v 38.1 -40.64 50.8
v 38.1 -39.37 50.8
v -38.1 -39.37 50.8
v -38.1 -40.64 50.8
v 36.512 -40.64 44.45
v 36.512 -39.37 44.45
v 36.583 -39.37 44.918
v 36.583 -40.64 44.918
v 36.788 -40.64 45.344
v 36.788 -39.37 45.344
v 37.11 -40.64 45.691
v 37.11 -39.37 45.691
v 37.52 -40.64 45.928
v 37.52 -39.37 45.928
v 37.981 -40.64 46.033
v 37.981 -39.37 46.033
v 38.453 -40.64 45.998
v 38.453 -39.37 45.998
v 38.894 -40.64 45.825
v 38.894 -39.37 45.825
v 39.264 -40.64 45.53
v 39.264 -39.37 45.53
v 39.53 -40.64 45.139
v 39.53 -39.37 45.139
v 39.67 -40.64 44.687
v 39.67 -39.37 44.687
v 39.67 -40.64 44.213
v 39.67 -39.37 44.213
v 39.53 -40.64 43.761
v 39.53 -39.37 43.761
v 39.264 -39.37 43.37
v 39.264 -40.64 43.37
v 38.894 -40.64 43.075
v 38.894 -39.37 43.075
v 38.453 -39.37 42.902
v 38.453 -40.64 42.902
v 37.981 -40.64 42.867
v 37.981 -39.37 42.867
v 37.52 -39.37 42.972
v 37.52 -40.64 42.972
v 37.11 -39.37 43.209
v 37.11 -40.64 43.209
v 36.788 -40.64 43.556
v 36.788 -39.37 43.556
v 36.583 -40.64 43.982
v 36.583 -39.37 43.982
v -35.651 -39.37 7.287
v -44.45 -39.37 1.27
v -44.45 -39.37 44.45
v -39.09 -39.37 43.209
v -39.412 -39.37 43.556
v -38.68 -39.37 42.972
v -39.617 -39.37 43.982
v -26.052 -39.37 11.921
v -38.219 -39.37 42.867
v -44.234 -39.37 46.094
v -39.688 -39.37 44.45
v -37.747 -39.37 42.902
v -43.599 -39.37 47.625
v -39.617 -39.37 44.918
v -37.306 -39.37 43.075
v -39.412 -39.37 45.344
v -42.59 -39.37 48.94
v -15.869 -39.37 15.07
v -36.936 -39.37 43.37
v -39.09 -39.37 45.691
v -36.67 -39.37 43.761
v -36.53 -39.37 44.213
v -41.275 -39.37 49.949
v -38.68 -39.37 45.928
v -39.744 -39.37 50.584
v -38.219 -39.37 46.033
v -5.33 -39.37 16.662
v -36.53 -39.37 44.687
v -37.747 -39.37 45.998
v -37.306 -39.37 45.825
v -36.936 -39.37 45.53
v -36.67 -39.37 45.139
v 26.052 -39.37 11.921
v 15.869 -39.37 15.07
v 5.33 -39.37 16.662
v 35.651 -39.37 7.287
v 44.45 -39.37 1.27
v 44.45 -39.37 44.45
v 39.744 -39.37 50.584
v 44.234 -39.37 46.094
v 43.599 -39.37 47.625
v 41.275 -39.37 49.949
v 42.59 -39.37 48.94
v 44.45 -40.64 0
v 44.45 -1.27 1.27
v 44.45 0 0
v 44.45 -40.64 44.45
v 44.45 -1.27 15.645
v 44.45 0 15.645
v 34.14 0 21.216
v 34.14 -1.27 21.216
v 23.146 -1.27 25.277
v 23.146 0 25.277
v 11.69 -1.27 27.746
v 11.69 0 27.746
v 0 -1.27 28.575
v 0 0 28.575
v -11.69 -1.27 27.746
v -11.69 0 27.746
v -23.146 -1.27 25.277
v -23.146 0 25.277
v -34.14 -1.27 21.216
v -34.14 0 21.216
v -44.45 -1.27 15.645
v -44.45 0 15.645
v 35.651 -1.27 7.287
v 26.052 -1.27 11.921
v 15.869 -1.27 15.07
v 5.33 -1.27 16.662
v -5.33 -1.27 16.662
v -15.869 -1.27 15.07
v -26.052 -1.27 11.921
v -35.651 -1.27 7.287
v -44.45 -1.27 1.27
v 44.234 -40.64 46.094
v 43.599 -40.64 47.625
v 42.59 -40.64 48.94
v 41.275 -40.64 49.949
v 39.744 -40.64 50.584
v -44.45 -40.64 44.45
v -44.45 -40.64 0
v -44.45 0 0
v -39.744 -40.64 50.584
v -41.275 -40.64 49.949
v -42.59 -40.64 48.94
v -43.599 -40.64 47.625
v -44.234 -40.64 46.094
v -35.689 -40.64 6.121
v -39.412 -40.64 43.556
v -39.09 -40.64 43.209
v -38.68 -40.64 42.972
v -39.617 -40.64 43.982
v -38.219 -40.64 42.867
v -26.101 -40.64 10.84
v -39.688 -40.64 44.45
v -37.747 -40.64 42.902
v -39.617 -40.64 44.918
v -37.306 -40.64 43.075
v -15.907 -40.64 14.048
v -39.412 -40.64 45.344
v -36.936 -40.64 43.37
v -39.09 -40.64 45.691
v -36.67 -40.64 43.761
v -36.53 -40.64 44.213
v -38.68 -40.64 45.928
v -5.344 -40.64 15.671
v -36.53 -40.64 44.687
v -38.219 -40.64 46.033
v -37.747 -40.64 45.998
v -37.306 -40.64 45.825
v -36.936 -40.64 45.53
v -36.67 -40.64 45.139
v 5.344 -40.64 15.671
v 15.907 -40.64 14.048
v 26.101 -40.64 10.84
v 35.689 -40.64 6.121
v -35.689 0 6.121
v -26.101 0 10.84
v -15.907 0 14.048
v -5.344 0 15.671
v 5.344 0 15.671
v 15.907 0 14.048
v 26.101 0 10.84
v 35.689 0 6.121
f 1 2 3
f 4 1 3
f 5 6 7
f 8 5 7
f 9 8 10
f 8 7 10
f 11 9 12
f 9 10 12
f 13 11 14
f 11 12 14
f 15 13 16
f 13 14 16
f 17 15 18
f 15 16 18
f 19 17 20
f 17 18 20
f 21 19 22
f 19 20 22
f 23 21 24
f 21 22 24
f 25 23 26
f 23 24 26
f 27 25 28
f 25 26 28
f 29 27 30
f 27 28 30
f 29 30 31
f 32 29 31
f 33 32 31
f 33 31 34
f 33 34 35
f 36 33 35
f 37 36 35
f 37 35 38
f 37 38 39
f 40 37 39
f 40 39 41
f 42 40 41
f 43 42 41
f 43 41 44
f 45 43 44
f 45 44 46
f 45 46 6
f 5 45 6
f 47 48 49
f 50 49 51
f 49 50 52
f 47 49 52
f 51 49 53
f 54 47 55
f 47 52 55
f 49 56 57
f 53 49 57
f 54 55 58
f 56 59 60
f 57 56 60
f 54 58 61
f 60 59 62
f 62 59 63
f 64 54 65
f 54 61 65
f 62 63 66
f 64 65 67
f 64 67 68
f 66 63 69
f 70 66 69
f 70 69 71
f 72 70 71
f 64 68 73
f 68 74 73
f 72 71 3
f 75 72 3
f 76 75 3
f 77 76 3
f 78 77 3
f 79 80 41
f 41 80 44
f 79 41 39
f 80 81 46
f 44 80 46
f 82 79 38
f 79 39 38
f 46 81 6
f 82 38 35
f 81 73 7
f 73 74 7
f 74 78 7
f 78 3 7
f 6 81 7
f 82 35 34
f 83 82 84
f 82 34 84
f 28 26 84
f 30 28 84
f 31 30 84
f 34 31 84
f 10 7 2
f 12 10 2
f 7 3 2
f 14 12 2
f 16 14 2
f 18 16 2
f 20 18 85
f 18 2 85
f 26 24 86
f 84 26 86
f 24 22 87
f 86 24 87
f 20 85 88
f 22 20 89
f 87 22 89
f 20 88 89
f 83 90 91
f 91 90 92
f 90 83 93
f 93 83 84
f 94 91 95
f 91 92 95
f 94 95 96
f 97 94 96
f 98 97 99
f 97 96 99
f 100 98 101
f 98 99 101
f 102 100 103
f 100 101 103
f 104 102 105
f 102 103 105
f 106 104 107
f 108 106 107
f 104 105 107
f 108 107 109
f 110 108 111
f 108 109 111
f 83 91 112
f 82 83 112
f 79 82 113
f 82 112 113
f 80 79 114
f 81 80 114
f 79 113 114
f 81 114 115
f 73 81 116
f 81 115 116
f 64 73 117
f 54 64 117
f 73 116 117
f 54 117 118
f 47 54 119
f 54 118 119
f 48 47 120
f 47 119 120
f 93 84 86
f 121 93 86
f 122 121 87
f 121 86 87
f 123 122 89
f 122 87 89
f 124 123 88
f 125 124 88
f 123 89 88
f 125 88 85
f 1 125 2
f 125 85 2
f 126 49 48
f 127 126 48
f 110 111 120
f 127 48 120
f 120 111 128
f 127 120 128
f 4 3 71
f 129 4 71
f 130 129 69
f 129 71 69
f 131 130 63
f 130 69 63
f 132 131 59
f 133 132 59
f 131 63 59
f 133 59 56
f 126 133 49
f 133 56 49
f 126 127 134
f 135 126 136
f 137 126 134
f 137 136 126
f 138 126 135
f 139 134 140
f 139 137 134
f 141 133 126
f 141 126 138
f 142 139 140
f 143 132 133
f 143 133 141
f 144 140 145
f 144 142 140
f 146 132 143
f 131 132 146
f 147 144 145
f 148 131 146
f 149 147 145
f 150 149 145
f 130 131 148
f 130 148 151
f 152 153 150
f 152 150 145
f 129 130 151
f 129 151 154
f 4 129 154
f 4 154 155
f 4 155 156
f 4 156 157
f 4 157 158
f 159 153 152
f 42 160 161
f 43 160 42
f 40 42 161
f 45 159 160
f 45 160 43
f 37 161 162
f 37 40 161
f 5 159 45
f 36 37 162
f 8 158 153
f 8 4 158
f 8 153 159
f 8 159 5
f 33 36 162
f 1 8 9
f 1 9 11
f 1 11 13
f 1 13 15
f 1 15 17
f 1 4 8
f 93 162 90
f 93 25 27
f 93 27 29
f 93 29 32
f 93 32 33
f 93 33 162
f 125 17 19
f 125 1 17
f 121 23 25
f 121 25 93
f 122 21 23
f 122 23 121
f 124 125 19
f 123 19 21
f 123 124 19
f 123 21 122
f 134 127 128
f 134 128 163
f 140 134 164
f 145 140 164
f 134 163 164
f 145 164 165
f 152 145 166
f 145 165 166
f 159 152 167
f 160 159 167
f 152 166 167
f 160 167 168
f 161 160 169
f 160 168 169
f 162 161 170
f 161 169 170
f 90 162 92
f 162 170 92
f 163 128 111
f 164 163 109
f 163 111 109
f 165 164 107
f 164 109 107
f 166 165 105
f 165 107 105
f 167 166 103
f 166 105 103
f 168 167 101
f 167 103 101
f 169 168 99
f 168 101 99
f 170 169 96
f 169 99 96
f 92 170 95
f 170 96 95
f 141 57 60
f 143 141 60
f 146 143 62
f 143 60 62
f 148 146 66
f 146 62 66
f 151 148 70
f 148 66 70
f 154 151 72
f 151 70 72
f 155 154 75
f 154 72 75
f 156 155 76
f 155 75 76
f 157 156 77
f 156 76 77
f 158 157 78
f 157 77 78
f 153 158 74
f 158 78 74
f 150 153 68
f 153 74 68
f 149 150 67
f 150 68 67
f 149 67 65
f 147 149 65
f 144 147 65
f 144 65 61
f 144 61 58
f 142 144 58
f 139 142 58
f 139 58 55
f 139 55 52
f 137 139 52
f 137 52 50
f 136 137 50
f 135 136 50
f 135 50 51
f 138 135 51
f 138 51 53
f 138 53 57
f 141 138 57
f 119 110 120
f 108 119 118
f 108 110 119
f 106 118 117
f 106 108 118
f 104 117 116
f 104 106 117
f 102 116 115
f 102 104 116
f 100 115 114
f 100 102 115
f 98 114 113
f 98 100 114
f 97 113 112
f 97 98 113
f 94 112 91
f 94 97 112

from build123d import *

# Parameters (mm, degrees)
F1_DEPTH = 1.27
F3_DEPTH = 38.1
F5_DEPTH = 1.27
F6_R     = 1.5875
F7_DEPTH = 25.4


with BuildPart() as f1:
    # F0 (on Front) → F1 (new body)
    with BuildSketch(Plane.XZ):
        with BuildLine():
            Line((-44.45, 15.644758), (-44.45, 0))
            ThreePointArc((-44.45, 0), (0, 15.875), (44.45, 0))
            Line((44.45, 0), (44.45, 15.644758))
            ThreePointArc((44.45, 15.644758), (0, 28.575), (-44.45, 15.644758))
        make_face()
    extrude(amount=F1_DEPTH)

    # F2 (on face) → F3 (join)
    with BuildSketch(Plane.XZ.offset(1.27)):
        with BuildLine():
            ThreePointArc((-44.45, 0), (0, 15.875), (44.45, 0))
            Line((44.45, 0), (44.45, 1.27))
            ThreePointArc((44.45, 1.27), (0, 16.862218), (-44.45, 1.27))
            Line((-44.45, 1.27), (-44.45, 0))
        make_face()
    extrude(amount=F3_DEPTH)

    # F4 (on face) → F5 (join)
    with BuildSketch(Plane.XZ.offset(39.37)):
        with BuildLine():
            Line((-44.45, 44.45), (-44.45, 0))
            ThreePointArc((-44.45, 0), (0, 15.875), (44.45, 0))
            Line((44.45, 0), (44.45, 44.45))
            ThreePointArc((44.45, 44.45), (42.590128, 48.940128), (38.1, 50.8))
            Line((38.1, 50.8), (-38.1, 50.8))
            ThreePointArc((-38.1, 50.8), (-42.590128, 48.940128), (-44.45, 44.45))
        make_face()
    extrude(amount=F5_DEPTH)

    # F6 (on face) → F7 (cut)
    with BuildSketch(Plane(origin=(0, -39.37, 0), x_dir=(-1, 0, 0), z_dir=(0, 1, 0))):
        with Locations((-38.1, 44.45)):
            Circle(F6_R)
        with Locations((38.1, 44.45)):
            Circle(F6_R)
    extrude(amount=-F7_DEPTH, mode=Mode.SUBTRACT)


solid = f1.part
